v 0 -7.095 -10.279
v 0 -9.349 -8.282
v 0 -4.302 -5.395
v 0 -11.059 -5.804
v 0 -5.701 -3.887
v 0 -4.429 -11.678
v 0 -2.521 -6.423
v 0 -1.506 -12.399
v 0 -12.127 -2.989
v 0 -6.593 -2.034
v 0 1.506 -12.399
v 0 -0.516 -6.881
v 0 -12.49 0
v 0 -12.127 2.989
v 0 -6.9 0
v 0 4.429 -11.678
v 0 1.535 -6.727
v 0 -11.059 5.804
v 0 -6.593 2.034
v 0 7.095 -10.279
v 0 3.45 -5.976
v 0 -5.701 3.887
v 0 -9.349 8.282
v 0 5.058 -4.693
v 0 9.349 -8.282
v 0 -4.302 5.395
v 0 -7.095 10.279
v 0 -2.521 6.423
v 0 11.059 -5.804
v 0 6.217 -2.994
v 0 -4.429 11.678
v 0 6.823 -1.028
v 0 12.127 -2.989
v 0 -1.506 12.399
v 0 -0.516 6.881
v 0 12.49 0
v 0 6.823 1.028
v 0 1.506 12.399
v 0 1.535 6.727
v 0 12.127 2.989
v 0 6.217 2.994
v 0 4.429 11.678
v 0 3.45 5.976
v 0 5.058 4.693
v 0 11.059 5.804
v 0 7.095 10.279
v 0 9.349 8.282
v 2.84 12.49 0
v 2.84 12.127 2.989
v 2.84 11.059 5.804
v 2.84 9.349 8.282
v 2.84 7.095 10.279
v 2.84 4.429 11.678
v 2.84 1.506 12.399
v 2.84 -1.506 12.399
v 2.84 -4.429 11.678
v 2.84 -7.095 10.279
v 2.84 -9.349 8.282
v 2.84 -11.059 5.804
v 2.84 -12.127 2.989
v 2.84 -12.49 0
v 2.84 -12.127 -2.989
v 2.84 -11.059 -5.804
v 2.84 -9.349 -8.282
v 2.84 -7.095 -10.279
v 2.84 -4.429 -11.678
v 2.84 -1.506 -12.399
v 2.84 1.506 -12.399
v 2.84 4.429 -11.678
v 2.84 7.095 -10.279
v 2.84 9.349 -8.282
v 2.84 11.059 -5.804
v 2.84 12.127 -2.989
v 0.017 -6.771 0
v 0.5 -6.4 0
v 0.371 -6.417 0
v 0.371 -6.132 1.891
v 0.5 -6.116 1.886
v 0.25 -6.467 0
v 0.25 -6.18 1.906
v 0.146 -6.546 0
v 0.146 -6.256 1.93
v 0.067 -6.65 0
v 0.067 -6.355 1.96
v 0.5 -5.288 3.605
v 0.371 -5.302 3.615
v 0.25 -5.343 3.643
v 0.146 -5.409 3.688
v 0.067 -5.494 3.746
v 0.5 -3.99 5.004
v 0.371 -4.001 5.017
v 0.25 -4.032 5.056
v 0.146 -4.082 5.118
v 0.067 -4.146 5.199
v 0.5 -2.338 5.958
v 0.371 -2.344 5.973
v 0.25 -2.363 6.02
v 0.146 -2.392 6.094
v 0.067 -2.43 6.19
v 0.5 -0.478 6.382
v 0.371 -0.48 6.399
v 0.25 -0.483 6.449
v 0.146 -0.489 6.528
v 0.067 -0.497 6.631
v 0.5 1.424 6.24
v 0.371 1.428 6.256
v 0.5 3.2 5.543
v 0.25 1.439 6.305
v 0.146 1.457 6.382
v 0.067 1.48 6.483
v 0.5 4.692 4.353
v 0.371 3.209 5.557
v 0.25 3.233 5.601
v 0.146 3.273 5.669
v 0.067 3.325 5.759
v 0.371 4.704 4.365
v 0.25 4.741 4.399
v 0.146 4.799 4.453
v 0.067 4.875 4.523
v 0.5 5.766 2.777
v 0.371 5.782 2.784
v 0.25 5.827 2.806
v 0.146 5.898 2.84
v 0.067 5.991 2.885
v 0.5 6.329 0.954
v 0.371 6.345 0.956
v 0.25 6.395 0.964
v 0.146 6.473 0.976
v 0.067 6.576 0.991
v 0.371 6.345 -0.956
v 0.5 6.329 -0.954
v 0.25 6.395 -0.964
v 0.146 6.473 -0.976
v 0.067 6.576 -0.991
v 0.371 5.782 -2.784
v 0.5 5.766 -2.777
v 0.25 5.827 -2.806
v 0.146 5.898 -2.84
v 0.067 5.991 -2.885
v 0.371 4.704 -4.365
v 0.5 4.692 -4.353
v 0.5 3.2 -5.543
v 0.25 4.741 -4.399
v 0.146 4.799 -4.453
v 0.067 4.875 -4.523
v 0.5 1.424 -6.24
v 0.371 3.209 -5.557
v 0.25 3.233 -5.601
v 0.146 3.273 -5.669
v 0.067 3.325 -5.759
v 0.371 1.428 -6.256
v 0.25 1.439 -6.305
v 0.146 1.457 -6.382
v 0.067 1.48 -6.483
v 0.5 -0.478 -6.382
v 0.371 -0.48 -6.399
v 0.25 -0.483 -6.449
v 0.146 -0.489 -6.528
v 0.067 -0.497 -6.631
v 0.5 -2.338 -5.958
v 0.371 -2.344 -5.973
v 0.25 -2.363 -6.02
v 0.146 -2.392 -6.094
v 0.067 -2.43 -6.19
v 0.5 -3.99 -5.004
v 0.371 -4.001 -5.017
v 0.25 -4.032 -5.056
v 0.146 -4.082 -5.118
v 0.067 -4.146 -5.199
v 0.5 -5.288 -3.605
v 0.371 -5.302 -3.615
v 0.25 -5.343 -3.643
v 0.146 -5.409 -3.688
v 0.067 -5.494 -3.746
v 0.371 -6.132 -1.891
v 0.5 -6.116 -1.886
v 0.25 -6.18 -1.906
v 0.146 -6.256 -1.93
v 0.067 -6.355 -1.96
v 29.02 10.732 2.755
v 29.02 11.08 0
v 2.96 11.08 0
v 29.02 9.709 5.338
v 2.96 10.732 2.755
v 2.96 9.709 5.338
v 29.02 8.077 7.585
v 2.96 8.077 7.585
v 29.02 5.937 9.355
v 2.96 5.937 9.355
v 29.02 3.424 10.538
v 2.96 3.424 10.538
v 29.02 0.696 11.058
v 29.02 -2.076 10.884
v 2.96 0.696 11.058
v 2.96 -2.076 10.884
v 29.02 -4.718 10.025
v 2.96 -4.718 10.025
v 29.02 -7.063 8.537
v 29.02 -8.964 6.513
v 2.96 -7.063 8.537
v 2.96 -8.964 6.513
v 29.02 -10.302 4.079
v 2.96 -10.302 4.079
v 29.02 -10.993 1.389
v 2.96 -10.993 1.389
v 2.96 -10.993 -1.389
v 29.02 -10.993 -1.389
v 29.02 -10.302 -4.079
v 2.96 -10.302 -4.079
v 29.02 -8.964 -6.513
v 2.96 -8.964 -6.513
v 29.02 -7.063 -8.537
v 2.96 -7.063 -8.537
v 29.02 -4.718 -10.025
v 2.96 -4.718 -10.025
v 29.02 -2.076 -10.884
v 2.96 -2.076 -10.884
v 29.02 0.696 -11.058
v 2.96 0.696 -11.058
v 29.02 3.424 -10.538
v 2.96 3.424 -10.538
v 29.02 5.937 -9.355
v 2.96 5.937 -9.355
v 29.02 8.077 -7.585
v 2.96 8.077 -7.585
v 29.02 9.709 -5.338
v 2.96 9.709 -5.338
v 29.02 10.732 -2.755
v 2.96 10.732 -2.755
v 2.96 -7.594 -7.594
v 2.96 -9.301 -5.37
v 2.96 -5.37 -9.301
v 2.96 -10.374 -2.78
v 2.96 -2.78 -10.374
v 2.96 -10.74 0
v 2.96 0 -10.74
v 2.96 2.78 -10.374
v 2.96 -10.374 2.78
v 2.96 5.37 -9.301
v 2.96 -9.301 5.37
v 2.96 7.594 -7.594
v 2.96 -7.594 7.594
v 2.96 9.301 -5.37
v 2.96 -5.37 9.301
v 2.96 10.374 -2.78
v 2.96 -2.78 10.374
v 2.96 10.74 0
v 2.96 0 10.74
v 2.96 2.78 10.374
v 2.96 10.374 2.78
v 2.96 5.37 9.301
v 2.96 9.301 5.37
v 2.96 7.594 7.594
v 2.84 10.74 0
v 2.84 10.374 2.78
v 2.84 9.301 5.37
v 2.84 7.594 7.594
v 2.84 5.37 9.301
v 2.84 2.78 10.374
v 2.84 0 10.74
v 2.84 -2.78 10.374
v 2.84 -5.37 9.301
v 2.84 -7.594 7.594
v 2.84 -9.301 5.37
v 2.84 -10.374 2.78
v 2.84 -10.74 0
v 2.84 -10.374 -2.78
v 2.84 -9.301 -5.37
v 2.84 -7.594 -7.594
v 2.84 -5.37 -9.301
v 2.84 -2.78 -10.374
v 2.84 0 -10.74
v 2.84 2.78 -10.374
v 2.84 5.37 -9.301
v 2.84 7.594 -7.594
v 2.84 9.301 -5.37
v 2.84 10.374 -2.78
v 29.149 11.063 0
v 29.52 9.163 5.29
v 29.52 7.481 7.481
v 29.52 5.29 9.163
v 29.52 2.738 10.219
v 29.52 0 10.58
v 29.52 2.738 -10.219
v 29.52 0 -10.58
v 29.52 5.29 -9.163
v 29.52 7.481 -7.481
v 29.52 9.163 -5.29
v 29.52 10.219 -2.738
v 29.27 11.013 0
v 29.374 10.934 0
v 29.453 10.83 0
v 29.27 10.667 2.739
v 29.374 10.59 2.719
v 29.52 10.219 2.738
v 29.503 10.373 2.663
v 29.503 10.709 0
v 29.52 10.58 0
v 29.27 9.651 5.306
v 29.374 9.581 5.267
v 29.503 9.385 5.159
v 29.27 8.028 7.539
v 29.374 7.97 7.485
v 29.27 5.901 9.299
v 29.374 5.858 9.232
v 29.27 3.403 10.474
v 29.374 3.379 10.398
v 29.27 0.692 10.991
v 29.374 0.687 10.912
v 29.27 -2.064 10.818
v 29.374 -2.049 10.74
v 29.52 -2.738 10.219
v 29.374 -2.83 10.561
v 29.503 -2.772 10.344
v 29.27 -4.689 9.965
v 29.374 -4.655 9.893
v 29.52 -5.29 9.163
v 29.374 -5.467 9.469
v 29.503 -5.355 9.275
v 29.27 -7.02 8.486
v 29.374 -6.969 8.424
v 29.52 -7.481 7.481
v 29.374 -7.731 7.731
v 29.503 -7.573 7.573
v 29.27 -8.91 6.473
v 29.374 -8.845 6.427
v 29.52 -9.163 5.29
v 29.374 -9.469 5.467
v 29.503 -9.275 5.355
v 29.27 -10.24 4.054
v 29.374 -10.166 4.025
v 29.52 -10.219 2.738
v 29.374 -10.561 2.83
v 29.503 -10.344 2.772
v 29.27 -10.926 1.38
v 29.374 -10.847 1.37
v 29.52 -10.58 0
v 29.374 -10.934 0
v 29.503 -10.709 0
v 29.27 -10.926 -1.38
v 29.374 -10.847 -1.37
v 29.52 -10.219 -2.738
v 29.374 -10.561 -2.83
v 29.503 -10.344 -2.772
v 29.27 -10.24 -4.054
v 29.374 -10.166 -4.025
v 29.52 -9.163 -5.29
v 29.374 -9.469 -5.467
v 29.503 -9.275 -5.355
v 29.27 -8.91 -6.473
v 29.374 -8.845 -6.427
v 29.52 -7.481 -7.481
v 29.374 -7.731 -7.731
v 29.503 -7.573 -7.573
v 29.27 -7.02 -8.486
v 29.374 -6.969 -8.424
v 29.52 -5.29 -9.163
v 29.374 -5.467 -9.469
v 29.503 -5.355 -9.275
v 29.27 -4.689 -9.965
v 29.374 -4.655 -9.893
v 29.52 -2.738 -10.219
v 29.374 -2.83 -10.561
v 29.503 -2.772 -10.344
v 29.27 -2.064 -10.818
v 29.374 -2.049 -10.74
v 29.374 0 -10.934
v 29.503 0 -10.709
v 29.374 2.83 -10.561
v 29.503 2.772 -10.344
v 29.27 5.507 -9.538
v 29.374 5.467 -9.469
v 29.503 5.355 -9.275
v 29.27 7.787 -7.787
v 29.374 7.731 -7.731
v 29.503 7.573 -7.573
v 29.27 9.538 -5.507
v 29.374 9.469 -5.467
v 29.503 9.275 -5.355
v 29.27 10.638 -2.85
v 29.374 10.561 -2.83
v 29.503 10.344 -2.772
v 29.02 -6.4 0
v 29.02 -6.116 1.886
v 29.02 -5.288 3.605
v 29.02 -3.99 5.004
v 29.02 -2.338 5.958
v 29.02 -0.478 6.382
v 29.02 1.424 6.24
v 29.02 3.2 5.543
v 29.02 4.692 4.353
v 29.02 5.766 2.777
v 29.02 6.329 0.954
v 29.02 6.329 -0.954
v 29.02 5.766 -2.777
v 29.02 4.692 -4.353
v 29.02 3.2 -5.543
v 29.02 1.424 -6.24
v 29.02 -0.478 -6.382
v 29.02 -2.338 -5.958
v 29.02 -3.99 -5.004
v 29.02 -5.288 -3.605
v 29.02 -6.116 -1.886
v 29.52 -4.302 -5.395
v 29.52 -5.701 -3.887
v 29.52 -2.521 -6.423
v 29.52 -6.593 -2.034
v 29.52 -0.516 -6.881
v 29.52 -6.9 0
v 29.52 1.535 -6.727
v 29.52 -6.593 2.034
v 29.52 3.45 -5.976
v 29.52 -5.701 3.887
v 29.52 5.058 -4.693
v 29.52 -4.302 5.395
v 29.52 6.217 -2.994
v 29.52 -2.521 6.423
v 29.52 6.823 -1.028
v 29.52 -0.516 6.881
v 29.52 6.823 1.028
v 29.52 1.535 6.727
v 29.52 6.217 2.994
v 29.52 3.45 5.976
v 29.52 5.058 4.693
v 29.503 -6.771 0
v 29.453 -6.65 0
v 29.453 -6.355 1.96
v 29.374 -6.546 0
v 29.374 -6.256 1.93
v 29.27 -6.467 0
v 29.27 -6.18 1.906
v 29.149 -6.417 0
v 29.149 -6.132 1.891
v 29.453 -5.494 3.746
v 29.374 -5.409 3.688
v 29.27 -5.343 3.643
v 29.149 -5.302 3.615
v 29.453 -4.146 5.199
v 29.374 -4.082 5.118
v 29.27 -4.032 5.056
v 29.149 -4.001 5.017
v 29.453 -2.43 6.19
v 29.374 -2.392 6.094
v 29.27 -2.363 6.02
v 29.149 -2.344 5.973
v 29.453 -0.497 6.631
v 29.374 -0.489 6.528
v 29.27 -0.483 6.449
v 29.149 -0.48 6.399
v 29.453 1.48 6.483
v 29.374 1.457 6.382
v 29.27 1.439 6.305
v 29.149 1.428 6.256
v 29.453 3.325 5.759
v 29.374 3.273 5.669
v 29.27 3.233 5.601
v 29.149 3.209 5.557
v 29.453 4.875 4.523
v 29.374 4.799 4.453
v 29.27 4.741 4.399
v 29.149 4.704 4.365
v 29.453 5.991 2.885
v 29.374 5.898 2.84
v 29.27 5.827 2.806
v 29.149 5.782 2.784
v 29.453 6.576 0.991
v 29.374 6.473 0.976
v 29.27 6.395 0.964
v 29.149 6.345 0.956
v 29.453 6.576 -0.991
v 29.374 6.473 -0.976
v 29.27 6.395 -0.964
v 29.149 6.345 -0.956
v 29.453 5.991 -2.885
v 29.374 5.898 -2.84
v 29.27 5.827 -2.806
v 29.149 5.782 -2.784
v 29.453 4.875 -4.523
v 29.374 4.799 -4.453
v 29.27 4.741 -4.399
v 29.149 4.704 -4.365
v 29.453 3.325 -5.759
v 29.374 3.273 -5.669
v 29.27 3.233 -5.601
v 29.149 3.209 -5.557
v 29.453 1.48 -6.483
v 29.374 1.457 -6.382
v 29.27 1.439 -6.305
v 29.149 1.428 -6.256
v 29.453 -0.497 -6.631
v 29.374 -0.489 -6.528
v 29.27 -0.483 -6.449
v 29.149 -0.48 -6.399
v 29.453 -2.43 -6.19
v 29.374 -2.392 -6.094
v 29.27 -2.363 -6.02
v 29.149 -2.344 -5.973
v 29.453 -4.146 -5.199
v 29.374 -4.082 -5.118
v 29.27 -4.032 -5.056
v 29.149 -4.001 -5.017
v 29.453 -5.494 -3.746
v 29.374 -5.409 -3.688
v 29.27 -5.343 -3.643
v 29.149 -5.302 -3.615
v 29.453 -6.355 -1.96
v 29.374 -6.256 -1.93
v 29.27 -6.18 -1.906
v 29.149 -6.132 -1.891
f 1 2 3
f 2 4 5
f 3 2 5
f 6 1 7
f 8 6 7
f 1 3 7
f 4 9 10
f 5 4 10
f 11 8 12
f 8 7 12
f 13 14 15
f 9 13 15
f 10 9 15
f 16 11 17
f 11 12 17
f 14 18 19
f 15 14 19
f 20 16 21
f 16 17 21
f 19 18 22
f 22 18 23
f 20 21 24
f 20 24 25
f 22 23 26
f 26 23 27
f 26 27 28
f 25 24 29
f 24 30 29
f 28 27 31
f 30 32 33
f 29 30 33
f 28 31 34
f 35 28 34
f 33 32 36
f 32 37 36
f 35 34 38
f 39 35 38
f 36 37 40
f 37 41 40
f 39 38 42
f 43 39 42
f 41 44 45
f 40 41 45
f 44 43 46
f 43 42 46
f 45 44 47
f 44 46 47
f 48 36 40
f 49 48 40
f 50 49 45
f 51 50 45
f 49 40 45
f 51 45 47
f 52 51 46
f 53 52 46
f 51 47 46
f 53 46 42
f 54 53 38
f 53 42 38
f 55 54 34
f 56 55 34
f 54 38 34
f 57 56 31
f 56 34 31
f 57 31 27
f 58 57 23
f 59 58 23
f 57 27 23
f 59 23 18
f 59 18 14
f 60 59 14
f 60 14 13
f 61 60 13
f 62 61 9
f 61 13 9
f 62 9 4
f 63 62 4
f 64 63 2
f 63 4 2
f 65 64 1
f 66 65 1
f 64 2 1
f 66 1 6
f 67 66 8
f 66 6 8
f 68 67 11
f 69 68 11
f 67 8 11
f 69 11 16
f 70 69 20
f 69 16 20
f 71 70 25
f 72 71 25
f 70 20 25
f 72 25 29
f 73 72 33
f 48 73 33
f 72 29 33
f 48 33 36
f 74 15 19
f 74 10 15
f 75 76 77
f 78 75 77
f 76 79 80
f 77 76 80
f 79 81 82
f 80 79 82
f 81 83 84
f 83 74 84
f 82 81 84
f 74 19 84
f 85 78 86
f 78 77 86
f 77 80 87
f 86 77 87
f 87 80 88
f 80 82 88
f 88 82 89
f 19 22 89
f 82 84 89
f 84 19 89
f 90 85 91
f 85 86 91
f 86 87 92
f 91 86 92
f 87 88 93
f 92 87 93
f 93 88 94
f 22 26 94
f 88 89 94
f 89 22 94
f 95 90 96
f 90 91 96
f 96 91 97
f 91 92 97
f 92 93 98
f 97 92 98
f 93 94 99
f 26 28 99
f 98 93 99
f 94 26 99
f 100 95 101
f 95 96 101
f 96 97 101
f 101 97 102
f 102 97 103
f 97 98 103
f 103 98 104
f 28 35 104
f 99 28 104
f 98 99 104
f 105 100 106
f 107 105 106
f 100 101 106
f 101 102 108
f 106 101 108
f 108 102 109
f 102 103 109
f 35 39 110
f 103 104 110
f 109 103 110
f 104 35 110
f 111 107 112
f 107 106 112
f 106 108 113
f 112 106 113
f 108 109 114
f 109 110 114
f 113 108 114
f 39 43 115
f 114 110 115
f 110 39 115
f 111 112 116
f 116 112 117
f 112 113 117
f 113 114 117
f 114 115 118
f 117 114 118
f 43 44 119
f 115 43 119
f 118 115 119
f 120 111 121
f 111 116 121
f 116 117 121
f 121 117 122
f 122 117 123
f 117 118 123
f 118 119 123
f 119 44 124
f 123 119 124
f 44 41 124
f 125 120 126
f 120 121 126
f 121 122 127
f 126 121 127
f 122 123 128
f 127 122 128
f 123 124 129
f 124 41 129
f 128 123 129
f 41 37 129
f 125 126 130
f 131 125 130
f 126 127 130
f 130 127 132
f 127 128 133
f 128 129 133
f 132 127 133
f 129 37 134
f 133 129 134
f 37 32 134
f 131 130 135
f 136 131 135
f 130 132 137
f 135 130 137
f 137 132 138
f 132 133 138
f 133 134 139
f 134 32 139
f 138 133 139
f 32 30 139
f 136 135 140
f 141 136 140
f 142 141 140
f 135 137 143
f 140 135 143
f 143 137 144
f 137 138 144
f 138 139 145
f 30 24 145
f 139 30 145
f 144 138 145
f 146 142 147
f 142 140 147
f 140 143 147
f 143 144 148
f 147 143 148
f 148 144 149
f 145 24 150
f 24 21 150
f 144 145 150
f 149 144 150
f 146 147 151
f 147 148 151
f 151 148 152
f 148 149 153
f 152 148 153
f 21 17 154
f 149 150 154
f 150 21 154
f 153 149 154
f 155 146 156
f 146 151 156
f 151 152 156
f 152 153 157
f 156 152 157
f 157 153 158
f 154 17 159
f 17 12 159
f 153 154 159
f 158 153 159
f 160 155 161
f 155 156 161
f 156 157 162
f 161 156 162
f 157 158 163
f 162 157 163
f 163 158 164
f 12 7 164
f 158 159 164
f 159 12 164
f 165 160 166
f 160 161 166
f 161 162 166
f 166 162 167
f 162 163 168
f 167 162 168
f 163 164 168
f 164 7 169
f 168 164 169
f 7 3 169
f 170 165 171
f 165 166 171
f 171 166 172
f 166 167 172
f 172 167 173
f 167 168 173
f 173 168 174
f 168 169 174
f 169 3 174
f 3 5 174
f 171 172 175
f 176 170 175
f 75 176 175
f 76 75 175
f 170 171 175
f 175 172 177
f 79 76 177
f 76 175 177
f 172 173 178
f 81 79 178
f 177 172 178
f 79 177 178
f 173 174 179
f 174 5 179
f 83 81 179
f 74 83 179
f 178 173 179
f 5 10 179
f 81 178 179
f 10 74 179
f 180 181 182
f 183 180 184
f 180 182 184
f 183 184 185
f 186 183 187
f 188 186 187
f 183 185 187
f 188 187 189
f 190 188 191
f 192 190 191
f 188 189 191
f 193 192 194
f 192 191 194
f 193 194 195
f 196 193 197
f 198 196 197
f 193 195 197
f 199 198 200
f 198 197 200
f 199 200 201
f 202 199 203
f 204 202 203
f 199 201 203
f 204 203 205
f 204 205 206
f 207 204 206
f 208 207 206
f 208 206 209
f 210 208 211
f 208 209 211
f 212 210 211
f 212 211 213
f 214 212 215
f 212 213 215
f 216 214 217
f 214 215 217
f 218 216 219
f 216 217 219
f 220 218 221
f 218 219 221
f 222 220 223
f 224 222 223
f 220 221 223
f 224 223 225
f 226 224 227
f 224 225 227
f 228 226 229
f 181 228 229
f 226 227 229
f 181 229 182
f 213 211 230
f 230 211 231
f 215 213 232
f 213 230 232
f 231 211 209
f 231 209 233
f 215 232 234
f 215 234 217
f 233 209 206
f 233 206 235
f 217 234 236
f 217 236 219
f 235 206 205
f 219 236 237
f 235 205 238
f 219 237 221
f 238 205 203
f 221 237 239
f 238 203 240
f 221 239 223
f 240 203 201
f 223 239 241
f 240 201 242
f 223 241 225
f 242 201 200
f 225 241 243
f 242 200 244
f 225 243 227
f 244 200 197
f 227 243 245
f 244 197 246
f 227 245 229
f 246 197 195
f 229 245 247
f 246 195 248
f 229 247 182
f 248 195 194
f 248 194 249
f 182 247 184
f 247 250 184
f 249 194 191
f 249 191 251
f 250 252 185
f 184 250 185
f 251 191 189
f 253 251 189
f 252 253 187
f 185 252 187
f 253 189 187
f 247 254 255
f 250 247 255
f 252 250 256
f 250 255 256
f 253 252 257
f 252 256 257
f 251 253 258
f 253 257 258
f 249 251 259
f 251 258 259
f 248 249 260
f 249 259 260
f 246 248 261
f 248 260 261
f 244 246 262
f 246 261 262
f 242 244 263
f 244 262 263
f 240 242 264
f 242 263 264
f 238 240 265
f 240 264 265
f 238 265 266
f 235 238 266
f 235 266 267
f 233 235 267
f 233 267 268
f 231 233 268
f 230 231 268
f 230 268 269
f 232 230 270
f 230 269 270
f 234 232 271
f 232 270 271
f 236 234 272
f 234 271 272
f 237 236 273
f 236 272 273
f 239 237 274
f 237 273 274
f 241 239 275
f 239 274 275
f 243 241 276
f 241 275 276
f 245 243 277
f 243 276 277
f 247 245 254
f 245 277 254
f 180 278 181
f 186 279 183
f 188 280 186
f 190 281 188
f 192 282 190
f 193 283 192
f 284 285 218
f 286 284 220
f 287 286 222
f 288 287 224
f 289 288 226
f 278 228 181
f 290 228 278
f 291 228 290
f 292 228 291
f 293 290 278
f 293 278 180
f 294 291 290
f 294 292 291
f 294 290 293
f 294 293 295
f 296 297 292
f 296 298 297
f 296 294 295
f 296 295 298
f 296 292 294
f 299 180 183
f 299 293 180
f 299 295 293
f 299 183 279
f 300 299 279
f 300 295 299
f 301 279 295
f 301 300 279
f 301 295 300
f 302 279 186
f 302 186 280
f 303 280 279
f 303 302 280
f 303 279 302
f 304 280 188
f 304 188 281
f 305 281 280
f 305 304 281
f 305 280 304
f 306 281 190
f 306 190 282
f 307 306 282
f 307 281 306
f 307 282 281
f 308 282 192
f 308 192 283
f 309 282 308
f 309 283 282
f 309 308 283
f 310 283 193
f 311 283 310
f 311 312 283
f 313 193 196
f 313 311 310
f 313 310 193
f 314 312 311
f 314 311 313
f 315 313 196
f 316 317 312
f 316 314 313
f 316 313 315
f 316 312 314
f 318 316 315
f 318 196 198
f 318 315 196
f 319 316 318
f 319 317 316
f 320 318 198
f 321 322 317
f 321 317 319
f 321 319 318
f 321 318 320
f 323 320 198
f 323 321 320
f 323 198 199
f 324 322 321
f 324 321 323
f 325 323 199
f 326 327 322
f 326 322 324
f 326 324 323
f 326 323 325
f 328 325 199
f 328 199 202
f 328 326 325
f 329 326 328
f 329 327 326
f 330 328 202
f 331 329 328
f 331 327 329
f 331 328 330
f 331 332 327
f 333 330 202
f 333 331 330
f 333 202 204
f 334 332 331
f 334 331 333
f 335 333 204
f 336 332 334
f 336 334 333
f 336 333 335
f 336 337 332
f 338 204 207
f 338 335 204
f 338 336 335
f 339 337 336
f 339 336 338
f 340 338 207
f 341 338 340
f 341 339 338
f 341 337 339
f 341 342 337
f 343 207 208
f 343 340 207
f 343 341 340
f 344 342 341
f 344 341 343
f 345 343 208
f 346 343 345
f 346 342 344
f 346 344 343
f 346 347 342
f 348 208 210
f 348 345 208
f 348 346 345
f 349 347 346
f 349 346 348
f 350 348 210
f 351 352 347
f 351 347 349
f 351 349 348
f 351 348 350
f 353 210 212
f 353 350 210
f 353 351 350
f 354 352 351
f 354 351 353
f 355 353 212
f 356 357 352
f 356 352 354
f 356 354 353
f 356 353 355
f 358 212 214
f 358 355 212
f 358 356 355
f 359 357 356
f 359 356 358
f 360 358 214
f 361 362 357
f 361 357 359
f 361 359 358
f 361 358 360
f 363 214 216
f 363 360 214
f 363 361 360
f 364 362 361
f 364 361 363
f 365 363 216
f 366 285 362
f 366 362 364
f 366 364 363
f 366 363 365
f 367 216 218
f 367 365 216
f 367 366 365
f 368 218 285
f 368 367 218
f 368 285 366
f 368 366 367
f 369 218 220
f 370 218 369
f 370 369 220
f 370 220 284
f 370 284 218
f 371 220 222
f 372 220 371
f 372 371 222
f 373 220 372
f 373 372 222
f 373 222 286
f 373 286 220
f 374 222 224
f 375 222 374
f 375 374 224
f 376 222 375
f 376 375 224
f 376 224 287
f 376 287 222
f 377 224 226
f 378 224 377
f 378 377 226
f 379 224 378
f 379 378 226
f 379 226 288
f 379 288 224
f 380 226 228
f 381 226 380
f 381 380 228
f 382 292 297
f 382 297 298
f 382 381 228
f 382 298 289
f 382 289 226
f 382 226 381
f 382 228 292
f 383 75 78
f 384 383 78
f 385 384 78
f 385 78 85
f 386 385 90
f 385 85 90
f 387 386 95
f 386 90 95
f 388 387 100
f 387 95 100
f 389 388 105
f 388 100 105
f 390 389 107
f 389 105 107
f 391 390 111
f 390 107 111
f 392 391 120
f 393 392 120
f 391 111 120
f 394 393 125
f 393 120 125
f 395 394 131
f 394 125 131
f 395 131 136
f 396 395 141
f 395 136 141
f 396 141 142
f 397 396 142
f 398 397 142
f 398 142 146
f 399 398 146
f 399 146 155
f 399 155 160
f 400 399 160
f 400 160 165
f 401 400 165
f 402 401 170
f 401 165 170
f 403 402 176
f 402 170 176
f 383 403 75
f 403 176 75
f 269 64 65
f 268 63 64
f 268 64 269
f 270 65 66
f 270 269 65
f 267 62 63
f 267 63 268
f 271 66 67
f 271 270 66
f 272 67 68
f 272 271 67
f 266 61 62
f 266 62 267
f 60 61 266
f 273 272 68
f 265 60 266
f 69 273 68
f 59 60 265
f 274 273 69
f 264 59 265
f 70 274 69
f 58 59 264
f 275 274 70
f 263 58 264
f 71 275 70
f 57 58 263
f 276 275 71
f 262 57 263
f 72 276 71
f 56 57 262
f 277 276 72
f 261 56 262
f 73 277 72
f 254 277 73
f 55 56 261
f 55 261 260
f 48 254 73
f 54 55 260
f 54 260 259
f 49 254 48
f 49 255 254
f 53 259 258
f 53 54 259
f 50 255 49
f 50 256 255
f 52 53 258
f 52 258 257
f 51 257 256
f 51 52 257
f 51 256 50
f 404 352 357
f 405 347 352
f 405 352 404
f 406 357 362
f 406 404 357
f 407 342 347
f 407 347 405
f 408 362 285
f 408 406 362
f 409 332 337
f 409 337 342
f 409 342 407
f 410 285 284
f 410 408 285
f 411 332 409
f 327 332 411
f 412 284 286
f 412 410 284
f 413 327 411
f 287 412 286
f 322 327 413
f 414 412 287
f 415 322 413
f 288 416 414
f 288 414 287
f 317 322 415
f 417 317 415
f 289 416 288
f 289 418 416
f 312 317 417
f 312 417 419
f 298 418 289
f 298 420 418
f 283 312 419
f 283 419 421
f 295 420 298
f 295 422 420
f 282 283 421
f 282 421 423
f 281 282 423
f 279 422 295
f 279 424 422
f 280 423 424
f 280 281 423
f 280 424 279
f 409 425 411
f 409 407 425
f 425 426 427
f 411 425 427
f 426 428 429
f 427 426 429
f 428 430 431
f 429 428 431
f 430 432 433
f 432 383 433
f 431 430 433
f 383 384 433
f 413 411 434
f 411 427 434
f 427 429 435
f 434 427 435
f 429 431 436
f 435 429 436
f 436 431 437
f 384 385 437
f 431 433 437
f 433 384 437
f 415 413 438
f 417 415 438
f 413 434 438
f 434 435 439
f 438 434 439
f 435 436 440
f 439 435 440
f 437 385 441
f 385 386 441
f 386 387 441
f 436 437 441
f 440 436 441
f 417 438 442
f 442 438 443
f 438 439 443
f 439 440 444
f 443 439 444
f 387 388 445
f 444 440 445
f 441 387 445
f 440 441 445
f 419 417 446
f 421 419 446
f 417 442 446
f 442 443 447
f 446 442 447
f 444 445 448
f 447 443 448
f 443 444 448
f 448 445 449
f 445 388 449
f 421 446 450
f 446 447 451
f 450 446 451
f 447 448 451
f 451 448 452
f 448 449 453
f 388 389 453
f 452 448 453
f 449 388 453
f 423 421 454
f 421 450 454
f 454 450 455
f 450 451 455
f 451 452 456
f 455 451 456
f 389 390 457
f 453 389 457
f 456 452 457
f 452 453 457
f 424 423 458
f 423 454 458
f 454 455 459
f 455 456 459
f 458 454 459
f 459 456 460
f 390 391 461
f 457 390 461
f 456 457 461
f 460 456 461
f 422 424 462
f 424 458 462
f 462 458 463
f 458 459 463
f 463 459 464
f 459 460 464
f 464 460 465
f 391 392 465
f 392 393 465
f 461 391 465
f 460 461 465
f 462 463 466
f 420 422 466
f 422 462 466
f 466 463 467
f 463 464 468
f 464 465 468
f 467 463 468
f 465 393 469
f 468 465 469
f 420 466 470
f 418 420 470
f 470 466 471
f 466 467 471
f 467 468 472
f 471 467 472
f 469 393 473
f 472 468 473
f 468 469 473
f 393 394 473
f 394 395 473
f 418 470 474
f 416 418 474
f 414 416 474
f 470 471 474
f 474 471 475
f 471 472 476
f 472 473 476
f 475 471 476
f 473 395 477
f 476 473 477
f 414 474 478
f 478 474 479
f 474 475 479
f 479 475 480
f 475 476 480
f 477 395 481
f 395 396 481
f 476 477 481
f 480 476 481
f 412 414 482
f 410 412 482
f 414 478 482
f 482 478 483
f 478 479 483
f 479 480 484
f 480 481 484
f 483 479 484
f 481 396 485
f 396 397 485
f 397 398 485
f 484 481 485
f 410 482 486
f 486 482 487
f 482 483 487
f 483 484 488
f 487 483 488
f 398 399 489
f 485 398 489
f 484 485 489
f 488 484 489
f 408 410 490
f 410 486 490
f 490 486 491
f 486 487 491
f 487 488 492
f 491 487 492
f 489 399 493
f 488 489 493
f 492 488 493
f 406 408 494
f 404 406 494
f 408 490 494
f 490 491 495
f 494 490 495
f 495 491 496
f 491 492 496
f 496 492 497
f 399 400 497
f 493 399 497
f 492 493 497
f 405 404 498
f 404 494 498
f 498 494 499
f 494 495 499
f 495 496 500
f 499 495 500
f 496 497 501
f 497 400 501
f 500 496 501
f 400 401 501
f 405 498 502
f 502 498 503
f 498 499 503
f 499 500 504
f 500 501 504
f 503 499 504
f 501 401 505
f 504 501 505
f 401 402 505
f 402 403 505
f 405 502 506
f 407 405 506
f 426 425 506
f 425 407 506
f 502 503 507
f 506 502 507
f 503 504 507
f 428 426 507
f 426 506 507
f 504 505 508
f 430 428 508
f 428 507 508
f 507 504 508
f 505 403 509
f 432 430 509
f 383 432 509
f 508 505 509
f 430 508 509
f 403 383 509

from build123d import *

# Parameters (mm, degrees)
F0_R     = 12.49
F1_DEPTH = 2.84
F2_R     = 10.74
F3_DEPTH = 0.12
F4_R     = 11.08
F5_DEPTH = 26.56
F6_R     = 6.4
F7_DEPTH = 29.52
F8_R     = 0.5


with BuildPart() as f1:
    # F0 (on Right) → F1 (new body)
    with BuildSketch(Plane.YZ):
        Circle(F0_R)
    extrude(amount=F1_DEPTH)

    # F2 (on face) → F3 (join)
    with BuildSketch(Plane.YZ.offset(2.84)):
        Circle(F2_R)
    extrude(amount=F3_DEPTH)

    # F4 (on face) → F5 (join)
    with BuildSketch(Plane.YZ.offset(2.96)):
        Circle(F4_R)
    extrude(amount=F5_DEPTH)

    # F6 (on face) → F7 (cut)
    with BuildSketch(Plane(origin=(0, 0, 0), x_dir=(0, -1, 0), z_dir=(-1, 0, 0))):
        Circle(F6_R)
    extrude(amount=-F7_DEPTH, mode=Mode.SUBTRACT)

    # F8
    f8_edges = [f1.edges().sort_by_distance(p)[0] for p in [
        (0, 6.4, 0),
        (29.52, -11.08, 0),
        (29.52, 6.4, 0),
    ]]
    fillet(f8_edges, radius=F8_R)


solid = f1.part
